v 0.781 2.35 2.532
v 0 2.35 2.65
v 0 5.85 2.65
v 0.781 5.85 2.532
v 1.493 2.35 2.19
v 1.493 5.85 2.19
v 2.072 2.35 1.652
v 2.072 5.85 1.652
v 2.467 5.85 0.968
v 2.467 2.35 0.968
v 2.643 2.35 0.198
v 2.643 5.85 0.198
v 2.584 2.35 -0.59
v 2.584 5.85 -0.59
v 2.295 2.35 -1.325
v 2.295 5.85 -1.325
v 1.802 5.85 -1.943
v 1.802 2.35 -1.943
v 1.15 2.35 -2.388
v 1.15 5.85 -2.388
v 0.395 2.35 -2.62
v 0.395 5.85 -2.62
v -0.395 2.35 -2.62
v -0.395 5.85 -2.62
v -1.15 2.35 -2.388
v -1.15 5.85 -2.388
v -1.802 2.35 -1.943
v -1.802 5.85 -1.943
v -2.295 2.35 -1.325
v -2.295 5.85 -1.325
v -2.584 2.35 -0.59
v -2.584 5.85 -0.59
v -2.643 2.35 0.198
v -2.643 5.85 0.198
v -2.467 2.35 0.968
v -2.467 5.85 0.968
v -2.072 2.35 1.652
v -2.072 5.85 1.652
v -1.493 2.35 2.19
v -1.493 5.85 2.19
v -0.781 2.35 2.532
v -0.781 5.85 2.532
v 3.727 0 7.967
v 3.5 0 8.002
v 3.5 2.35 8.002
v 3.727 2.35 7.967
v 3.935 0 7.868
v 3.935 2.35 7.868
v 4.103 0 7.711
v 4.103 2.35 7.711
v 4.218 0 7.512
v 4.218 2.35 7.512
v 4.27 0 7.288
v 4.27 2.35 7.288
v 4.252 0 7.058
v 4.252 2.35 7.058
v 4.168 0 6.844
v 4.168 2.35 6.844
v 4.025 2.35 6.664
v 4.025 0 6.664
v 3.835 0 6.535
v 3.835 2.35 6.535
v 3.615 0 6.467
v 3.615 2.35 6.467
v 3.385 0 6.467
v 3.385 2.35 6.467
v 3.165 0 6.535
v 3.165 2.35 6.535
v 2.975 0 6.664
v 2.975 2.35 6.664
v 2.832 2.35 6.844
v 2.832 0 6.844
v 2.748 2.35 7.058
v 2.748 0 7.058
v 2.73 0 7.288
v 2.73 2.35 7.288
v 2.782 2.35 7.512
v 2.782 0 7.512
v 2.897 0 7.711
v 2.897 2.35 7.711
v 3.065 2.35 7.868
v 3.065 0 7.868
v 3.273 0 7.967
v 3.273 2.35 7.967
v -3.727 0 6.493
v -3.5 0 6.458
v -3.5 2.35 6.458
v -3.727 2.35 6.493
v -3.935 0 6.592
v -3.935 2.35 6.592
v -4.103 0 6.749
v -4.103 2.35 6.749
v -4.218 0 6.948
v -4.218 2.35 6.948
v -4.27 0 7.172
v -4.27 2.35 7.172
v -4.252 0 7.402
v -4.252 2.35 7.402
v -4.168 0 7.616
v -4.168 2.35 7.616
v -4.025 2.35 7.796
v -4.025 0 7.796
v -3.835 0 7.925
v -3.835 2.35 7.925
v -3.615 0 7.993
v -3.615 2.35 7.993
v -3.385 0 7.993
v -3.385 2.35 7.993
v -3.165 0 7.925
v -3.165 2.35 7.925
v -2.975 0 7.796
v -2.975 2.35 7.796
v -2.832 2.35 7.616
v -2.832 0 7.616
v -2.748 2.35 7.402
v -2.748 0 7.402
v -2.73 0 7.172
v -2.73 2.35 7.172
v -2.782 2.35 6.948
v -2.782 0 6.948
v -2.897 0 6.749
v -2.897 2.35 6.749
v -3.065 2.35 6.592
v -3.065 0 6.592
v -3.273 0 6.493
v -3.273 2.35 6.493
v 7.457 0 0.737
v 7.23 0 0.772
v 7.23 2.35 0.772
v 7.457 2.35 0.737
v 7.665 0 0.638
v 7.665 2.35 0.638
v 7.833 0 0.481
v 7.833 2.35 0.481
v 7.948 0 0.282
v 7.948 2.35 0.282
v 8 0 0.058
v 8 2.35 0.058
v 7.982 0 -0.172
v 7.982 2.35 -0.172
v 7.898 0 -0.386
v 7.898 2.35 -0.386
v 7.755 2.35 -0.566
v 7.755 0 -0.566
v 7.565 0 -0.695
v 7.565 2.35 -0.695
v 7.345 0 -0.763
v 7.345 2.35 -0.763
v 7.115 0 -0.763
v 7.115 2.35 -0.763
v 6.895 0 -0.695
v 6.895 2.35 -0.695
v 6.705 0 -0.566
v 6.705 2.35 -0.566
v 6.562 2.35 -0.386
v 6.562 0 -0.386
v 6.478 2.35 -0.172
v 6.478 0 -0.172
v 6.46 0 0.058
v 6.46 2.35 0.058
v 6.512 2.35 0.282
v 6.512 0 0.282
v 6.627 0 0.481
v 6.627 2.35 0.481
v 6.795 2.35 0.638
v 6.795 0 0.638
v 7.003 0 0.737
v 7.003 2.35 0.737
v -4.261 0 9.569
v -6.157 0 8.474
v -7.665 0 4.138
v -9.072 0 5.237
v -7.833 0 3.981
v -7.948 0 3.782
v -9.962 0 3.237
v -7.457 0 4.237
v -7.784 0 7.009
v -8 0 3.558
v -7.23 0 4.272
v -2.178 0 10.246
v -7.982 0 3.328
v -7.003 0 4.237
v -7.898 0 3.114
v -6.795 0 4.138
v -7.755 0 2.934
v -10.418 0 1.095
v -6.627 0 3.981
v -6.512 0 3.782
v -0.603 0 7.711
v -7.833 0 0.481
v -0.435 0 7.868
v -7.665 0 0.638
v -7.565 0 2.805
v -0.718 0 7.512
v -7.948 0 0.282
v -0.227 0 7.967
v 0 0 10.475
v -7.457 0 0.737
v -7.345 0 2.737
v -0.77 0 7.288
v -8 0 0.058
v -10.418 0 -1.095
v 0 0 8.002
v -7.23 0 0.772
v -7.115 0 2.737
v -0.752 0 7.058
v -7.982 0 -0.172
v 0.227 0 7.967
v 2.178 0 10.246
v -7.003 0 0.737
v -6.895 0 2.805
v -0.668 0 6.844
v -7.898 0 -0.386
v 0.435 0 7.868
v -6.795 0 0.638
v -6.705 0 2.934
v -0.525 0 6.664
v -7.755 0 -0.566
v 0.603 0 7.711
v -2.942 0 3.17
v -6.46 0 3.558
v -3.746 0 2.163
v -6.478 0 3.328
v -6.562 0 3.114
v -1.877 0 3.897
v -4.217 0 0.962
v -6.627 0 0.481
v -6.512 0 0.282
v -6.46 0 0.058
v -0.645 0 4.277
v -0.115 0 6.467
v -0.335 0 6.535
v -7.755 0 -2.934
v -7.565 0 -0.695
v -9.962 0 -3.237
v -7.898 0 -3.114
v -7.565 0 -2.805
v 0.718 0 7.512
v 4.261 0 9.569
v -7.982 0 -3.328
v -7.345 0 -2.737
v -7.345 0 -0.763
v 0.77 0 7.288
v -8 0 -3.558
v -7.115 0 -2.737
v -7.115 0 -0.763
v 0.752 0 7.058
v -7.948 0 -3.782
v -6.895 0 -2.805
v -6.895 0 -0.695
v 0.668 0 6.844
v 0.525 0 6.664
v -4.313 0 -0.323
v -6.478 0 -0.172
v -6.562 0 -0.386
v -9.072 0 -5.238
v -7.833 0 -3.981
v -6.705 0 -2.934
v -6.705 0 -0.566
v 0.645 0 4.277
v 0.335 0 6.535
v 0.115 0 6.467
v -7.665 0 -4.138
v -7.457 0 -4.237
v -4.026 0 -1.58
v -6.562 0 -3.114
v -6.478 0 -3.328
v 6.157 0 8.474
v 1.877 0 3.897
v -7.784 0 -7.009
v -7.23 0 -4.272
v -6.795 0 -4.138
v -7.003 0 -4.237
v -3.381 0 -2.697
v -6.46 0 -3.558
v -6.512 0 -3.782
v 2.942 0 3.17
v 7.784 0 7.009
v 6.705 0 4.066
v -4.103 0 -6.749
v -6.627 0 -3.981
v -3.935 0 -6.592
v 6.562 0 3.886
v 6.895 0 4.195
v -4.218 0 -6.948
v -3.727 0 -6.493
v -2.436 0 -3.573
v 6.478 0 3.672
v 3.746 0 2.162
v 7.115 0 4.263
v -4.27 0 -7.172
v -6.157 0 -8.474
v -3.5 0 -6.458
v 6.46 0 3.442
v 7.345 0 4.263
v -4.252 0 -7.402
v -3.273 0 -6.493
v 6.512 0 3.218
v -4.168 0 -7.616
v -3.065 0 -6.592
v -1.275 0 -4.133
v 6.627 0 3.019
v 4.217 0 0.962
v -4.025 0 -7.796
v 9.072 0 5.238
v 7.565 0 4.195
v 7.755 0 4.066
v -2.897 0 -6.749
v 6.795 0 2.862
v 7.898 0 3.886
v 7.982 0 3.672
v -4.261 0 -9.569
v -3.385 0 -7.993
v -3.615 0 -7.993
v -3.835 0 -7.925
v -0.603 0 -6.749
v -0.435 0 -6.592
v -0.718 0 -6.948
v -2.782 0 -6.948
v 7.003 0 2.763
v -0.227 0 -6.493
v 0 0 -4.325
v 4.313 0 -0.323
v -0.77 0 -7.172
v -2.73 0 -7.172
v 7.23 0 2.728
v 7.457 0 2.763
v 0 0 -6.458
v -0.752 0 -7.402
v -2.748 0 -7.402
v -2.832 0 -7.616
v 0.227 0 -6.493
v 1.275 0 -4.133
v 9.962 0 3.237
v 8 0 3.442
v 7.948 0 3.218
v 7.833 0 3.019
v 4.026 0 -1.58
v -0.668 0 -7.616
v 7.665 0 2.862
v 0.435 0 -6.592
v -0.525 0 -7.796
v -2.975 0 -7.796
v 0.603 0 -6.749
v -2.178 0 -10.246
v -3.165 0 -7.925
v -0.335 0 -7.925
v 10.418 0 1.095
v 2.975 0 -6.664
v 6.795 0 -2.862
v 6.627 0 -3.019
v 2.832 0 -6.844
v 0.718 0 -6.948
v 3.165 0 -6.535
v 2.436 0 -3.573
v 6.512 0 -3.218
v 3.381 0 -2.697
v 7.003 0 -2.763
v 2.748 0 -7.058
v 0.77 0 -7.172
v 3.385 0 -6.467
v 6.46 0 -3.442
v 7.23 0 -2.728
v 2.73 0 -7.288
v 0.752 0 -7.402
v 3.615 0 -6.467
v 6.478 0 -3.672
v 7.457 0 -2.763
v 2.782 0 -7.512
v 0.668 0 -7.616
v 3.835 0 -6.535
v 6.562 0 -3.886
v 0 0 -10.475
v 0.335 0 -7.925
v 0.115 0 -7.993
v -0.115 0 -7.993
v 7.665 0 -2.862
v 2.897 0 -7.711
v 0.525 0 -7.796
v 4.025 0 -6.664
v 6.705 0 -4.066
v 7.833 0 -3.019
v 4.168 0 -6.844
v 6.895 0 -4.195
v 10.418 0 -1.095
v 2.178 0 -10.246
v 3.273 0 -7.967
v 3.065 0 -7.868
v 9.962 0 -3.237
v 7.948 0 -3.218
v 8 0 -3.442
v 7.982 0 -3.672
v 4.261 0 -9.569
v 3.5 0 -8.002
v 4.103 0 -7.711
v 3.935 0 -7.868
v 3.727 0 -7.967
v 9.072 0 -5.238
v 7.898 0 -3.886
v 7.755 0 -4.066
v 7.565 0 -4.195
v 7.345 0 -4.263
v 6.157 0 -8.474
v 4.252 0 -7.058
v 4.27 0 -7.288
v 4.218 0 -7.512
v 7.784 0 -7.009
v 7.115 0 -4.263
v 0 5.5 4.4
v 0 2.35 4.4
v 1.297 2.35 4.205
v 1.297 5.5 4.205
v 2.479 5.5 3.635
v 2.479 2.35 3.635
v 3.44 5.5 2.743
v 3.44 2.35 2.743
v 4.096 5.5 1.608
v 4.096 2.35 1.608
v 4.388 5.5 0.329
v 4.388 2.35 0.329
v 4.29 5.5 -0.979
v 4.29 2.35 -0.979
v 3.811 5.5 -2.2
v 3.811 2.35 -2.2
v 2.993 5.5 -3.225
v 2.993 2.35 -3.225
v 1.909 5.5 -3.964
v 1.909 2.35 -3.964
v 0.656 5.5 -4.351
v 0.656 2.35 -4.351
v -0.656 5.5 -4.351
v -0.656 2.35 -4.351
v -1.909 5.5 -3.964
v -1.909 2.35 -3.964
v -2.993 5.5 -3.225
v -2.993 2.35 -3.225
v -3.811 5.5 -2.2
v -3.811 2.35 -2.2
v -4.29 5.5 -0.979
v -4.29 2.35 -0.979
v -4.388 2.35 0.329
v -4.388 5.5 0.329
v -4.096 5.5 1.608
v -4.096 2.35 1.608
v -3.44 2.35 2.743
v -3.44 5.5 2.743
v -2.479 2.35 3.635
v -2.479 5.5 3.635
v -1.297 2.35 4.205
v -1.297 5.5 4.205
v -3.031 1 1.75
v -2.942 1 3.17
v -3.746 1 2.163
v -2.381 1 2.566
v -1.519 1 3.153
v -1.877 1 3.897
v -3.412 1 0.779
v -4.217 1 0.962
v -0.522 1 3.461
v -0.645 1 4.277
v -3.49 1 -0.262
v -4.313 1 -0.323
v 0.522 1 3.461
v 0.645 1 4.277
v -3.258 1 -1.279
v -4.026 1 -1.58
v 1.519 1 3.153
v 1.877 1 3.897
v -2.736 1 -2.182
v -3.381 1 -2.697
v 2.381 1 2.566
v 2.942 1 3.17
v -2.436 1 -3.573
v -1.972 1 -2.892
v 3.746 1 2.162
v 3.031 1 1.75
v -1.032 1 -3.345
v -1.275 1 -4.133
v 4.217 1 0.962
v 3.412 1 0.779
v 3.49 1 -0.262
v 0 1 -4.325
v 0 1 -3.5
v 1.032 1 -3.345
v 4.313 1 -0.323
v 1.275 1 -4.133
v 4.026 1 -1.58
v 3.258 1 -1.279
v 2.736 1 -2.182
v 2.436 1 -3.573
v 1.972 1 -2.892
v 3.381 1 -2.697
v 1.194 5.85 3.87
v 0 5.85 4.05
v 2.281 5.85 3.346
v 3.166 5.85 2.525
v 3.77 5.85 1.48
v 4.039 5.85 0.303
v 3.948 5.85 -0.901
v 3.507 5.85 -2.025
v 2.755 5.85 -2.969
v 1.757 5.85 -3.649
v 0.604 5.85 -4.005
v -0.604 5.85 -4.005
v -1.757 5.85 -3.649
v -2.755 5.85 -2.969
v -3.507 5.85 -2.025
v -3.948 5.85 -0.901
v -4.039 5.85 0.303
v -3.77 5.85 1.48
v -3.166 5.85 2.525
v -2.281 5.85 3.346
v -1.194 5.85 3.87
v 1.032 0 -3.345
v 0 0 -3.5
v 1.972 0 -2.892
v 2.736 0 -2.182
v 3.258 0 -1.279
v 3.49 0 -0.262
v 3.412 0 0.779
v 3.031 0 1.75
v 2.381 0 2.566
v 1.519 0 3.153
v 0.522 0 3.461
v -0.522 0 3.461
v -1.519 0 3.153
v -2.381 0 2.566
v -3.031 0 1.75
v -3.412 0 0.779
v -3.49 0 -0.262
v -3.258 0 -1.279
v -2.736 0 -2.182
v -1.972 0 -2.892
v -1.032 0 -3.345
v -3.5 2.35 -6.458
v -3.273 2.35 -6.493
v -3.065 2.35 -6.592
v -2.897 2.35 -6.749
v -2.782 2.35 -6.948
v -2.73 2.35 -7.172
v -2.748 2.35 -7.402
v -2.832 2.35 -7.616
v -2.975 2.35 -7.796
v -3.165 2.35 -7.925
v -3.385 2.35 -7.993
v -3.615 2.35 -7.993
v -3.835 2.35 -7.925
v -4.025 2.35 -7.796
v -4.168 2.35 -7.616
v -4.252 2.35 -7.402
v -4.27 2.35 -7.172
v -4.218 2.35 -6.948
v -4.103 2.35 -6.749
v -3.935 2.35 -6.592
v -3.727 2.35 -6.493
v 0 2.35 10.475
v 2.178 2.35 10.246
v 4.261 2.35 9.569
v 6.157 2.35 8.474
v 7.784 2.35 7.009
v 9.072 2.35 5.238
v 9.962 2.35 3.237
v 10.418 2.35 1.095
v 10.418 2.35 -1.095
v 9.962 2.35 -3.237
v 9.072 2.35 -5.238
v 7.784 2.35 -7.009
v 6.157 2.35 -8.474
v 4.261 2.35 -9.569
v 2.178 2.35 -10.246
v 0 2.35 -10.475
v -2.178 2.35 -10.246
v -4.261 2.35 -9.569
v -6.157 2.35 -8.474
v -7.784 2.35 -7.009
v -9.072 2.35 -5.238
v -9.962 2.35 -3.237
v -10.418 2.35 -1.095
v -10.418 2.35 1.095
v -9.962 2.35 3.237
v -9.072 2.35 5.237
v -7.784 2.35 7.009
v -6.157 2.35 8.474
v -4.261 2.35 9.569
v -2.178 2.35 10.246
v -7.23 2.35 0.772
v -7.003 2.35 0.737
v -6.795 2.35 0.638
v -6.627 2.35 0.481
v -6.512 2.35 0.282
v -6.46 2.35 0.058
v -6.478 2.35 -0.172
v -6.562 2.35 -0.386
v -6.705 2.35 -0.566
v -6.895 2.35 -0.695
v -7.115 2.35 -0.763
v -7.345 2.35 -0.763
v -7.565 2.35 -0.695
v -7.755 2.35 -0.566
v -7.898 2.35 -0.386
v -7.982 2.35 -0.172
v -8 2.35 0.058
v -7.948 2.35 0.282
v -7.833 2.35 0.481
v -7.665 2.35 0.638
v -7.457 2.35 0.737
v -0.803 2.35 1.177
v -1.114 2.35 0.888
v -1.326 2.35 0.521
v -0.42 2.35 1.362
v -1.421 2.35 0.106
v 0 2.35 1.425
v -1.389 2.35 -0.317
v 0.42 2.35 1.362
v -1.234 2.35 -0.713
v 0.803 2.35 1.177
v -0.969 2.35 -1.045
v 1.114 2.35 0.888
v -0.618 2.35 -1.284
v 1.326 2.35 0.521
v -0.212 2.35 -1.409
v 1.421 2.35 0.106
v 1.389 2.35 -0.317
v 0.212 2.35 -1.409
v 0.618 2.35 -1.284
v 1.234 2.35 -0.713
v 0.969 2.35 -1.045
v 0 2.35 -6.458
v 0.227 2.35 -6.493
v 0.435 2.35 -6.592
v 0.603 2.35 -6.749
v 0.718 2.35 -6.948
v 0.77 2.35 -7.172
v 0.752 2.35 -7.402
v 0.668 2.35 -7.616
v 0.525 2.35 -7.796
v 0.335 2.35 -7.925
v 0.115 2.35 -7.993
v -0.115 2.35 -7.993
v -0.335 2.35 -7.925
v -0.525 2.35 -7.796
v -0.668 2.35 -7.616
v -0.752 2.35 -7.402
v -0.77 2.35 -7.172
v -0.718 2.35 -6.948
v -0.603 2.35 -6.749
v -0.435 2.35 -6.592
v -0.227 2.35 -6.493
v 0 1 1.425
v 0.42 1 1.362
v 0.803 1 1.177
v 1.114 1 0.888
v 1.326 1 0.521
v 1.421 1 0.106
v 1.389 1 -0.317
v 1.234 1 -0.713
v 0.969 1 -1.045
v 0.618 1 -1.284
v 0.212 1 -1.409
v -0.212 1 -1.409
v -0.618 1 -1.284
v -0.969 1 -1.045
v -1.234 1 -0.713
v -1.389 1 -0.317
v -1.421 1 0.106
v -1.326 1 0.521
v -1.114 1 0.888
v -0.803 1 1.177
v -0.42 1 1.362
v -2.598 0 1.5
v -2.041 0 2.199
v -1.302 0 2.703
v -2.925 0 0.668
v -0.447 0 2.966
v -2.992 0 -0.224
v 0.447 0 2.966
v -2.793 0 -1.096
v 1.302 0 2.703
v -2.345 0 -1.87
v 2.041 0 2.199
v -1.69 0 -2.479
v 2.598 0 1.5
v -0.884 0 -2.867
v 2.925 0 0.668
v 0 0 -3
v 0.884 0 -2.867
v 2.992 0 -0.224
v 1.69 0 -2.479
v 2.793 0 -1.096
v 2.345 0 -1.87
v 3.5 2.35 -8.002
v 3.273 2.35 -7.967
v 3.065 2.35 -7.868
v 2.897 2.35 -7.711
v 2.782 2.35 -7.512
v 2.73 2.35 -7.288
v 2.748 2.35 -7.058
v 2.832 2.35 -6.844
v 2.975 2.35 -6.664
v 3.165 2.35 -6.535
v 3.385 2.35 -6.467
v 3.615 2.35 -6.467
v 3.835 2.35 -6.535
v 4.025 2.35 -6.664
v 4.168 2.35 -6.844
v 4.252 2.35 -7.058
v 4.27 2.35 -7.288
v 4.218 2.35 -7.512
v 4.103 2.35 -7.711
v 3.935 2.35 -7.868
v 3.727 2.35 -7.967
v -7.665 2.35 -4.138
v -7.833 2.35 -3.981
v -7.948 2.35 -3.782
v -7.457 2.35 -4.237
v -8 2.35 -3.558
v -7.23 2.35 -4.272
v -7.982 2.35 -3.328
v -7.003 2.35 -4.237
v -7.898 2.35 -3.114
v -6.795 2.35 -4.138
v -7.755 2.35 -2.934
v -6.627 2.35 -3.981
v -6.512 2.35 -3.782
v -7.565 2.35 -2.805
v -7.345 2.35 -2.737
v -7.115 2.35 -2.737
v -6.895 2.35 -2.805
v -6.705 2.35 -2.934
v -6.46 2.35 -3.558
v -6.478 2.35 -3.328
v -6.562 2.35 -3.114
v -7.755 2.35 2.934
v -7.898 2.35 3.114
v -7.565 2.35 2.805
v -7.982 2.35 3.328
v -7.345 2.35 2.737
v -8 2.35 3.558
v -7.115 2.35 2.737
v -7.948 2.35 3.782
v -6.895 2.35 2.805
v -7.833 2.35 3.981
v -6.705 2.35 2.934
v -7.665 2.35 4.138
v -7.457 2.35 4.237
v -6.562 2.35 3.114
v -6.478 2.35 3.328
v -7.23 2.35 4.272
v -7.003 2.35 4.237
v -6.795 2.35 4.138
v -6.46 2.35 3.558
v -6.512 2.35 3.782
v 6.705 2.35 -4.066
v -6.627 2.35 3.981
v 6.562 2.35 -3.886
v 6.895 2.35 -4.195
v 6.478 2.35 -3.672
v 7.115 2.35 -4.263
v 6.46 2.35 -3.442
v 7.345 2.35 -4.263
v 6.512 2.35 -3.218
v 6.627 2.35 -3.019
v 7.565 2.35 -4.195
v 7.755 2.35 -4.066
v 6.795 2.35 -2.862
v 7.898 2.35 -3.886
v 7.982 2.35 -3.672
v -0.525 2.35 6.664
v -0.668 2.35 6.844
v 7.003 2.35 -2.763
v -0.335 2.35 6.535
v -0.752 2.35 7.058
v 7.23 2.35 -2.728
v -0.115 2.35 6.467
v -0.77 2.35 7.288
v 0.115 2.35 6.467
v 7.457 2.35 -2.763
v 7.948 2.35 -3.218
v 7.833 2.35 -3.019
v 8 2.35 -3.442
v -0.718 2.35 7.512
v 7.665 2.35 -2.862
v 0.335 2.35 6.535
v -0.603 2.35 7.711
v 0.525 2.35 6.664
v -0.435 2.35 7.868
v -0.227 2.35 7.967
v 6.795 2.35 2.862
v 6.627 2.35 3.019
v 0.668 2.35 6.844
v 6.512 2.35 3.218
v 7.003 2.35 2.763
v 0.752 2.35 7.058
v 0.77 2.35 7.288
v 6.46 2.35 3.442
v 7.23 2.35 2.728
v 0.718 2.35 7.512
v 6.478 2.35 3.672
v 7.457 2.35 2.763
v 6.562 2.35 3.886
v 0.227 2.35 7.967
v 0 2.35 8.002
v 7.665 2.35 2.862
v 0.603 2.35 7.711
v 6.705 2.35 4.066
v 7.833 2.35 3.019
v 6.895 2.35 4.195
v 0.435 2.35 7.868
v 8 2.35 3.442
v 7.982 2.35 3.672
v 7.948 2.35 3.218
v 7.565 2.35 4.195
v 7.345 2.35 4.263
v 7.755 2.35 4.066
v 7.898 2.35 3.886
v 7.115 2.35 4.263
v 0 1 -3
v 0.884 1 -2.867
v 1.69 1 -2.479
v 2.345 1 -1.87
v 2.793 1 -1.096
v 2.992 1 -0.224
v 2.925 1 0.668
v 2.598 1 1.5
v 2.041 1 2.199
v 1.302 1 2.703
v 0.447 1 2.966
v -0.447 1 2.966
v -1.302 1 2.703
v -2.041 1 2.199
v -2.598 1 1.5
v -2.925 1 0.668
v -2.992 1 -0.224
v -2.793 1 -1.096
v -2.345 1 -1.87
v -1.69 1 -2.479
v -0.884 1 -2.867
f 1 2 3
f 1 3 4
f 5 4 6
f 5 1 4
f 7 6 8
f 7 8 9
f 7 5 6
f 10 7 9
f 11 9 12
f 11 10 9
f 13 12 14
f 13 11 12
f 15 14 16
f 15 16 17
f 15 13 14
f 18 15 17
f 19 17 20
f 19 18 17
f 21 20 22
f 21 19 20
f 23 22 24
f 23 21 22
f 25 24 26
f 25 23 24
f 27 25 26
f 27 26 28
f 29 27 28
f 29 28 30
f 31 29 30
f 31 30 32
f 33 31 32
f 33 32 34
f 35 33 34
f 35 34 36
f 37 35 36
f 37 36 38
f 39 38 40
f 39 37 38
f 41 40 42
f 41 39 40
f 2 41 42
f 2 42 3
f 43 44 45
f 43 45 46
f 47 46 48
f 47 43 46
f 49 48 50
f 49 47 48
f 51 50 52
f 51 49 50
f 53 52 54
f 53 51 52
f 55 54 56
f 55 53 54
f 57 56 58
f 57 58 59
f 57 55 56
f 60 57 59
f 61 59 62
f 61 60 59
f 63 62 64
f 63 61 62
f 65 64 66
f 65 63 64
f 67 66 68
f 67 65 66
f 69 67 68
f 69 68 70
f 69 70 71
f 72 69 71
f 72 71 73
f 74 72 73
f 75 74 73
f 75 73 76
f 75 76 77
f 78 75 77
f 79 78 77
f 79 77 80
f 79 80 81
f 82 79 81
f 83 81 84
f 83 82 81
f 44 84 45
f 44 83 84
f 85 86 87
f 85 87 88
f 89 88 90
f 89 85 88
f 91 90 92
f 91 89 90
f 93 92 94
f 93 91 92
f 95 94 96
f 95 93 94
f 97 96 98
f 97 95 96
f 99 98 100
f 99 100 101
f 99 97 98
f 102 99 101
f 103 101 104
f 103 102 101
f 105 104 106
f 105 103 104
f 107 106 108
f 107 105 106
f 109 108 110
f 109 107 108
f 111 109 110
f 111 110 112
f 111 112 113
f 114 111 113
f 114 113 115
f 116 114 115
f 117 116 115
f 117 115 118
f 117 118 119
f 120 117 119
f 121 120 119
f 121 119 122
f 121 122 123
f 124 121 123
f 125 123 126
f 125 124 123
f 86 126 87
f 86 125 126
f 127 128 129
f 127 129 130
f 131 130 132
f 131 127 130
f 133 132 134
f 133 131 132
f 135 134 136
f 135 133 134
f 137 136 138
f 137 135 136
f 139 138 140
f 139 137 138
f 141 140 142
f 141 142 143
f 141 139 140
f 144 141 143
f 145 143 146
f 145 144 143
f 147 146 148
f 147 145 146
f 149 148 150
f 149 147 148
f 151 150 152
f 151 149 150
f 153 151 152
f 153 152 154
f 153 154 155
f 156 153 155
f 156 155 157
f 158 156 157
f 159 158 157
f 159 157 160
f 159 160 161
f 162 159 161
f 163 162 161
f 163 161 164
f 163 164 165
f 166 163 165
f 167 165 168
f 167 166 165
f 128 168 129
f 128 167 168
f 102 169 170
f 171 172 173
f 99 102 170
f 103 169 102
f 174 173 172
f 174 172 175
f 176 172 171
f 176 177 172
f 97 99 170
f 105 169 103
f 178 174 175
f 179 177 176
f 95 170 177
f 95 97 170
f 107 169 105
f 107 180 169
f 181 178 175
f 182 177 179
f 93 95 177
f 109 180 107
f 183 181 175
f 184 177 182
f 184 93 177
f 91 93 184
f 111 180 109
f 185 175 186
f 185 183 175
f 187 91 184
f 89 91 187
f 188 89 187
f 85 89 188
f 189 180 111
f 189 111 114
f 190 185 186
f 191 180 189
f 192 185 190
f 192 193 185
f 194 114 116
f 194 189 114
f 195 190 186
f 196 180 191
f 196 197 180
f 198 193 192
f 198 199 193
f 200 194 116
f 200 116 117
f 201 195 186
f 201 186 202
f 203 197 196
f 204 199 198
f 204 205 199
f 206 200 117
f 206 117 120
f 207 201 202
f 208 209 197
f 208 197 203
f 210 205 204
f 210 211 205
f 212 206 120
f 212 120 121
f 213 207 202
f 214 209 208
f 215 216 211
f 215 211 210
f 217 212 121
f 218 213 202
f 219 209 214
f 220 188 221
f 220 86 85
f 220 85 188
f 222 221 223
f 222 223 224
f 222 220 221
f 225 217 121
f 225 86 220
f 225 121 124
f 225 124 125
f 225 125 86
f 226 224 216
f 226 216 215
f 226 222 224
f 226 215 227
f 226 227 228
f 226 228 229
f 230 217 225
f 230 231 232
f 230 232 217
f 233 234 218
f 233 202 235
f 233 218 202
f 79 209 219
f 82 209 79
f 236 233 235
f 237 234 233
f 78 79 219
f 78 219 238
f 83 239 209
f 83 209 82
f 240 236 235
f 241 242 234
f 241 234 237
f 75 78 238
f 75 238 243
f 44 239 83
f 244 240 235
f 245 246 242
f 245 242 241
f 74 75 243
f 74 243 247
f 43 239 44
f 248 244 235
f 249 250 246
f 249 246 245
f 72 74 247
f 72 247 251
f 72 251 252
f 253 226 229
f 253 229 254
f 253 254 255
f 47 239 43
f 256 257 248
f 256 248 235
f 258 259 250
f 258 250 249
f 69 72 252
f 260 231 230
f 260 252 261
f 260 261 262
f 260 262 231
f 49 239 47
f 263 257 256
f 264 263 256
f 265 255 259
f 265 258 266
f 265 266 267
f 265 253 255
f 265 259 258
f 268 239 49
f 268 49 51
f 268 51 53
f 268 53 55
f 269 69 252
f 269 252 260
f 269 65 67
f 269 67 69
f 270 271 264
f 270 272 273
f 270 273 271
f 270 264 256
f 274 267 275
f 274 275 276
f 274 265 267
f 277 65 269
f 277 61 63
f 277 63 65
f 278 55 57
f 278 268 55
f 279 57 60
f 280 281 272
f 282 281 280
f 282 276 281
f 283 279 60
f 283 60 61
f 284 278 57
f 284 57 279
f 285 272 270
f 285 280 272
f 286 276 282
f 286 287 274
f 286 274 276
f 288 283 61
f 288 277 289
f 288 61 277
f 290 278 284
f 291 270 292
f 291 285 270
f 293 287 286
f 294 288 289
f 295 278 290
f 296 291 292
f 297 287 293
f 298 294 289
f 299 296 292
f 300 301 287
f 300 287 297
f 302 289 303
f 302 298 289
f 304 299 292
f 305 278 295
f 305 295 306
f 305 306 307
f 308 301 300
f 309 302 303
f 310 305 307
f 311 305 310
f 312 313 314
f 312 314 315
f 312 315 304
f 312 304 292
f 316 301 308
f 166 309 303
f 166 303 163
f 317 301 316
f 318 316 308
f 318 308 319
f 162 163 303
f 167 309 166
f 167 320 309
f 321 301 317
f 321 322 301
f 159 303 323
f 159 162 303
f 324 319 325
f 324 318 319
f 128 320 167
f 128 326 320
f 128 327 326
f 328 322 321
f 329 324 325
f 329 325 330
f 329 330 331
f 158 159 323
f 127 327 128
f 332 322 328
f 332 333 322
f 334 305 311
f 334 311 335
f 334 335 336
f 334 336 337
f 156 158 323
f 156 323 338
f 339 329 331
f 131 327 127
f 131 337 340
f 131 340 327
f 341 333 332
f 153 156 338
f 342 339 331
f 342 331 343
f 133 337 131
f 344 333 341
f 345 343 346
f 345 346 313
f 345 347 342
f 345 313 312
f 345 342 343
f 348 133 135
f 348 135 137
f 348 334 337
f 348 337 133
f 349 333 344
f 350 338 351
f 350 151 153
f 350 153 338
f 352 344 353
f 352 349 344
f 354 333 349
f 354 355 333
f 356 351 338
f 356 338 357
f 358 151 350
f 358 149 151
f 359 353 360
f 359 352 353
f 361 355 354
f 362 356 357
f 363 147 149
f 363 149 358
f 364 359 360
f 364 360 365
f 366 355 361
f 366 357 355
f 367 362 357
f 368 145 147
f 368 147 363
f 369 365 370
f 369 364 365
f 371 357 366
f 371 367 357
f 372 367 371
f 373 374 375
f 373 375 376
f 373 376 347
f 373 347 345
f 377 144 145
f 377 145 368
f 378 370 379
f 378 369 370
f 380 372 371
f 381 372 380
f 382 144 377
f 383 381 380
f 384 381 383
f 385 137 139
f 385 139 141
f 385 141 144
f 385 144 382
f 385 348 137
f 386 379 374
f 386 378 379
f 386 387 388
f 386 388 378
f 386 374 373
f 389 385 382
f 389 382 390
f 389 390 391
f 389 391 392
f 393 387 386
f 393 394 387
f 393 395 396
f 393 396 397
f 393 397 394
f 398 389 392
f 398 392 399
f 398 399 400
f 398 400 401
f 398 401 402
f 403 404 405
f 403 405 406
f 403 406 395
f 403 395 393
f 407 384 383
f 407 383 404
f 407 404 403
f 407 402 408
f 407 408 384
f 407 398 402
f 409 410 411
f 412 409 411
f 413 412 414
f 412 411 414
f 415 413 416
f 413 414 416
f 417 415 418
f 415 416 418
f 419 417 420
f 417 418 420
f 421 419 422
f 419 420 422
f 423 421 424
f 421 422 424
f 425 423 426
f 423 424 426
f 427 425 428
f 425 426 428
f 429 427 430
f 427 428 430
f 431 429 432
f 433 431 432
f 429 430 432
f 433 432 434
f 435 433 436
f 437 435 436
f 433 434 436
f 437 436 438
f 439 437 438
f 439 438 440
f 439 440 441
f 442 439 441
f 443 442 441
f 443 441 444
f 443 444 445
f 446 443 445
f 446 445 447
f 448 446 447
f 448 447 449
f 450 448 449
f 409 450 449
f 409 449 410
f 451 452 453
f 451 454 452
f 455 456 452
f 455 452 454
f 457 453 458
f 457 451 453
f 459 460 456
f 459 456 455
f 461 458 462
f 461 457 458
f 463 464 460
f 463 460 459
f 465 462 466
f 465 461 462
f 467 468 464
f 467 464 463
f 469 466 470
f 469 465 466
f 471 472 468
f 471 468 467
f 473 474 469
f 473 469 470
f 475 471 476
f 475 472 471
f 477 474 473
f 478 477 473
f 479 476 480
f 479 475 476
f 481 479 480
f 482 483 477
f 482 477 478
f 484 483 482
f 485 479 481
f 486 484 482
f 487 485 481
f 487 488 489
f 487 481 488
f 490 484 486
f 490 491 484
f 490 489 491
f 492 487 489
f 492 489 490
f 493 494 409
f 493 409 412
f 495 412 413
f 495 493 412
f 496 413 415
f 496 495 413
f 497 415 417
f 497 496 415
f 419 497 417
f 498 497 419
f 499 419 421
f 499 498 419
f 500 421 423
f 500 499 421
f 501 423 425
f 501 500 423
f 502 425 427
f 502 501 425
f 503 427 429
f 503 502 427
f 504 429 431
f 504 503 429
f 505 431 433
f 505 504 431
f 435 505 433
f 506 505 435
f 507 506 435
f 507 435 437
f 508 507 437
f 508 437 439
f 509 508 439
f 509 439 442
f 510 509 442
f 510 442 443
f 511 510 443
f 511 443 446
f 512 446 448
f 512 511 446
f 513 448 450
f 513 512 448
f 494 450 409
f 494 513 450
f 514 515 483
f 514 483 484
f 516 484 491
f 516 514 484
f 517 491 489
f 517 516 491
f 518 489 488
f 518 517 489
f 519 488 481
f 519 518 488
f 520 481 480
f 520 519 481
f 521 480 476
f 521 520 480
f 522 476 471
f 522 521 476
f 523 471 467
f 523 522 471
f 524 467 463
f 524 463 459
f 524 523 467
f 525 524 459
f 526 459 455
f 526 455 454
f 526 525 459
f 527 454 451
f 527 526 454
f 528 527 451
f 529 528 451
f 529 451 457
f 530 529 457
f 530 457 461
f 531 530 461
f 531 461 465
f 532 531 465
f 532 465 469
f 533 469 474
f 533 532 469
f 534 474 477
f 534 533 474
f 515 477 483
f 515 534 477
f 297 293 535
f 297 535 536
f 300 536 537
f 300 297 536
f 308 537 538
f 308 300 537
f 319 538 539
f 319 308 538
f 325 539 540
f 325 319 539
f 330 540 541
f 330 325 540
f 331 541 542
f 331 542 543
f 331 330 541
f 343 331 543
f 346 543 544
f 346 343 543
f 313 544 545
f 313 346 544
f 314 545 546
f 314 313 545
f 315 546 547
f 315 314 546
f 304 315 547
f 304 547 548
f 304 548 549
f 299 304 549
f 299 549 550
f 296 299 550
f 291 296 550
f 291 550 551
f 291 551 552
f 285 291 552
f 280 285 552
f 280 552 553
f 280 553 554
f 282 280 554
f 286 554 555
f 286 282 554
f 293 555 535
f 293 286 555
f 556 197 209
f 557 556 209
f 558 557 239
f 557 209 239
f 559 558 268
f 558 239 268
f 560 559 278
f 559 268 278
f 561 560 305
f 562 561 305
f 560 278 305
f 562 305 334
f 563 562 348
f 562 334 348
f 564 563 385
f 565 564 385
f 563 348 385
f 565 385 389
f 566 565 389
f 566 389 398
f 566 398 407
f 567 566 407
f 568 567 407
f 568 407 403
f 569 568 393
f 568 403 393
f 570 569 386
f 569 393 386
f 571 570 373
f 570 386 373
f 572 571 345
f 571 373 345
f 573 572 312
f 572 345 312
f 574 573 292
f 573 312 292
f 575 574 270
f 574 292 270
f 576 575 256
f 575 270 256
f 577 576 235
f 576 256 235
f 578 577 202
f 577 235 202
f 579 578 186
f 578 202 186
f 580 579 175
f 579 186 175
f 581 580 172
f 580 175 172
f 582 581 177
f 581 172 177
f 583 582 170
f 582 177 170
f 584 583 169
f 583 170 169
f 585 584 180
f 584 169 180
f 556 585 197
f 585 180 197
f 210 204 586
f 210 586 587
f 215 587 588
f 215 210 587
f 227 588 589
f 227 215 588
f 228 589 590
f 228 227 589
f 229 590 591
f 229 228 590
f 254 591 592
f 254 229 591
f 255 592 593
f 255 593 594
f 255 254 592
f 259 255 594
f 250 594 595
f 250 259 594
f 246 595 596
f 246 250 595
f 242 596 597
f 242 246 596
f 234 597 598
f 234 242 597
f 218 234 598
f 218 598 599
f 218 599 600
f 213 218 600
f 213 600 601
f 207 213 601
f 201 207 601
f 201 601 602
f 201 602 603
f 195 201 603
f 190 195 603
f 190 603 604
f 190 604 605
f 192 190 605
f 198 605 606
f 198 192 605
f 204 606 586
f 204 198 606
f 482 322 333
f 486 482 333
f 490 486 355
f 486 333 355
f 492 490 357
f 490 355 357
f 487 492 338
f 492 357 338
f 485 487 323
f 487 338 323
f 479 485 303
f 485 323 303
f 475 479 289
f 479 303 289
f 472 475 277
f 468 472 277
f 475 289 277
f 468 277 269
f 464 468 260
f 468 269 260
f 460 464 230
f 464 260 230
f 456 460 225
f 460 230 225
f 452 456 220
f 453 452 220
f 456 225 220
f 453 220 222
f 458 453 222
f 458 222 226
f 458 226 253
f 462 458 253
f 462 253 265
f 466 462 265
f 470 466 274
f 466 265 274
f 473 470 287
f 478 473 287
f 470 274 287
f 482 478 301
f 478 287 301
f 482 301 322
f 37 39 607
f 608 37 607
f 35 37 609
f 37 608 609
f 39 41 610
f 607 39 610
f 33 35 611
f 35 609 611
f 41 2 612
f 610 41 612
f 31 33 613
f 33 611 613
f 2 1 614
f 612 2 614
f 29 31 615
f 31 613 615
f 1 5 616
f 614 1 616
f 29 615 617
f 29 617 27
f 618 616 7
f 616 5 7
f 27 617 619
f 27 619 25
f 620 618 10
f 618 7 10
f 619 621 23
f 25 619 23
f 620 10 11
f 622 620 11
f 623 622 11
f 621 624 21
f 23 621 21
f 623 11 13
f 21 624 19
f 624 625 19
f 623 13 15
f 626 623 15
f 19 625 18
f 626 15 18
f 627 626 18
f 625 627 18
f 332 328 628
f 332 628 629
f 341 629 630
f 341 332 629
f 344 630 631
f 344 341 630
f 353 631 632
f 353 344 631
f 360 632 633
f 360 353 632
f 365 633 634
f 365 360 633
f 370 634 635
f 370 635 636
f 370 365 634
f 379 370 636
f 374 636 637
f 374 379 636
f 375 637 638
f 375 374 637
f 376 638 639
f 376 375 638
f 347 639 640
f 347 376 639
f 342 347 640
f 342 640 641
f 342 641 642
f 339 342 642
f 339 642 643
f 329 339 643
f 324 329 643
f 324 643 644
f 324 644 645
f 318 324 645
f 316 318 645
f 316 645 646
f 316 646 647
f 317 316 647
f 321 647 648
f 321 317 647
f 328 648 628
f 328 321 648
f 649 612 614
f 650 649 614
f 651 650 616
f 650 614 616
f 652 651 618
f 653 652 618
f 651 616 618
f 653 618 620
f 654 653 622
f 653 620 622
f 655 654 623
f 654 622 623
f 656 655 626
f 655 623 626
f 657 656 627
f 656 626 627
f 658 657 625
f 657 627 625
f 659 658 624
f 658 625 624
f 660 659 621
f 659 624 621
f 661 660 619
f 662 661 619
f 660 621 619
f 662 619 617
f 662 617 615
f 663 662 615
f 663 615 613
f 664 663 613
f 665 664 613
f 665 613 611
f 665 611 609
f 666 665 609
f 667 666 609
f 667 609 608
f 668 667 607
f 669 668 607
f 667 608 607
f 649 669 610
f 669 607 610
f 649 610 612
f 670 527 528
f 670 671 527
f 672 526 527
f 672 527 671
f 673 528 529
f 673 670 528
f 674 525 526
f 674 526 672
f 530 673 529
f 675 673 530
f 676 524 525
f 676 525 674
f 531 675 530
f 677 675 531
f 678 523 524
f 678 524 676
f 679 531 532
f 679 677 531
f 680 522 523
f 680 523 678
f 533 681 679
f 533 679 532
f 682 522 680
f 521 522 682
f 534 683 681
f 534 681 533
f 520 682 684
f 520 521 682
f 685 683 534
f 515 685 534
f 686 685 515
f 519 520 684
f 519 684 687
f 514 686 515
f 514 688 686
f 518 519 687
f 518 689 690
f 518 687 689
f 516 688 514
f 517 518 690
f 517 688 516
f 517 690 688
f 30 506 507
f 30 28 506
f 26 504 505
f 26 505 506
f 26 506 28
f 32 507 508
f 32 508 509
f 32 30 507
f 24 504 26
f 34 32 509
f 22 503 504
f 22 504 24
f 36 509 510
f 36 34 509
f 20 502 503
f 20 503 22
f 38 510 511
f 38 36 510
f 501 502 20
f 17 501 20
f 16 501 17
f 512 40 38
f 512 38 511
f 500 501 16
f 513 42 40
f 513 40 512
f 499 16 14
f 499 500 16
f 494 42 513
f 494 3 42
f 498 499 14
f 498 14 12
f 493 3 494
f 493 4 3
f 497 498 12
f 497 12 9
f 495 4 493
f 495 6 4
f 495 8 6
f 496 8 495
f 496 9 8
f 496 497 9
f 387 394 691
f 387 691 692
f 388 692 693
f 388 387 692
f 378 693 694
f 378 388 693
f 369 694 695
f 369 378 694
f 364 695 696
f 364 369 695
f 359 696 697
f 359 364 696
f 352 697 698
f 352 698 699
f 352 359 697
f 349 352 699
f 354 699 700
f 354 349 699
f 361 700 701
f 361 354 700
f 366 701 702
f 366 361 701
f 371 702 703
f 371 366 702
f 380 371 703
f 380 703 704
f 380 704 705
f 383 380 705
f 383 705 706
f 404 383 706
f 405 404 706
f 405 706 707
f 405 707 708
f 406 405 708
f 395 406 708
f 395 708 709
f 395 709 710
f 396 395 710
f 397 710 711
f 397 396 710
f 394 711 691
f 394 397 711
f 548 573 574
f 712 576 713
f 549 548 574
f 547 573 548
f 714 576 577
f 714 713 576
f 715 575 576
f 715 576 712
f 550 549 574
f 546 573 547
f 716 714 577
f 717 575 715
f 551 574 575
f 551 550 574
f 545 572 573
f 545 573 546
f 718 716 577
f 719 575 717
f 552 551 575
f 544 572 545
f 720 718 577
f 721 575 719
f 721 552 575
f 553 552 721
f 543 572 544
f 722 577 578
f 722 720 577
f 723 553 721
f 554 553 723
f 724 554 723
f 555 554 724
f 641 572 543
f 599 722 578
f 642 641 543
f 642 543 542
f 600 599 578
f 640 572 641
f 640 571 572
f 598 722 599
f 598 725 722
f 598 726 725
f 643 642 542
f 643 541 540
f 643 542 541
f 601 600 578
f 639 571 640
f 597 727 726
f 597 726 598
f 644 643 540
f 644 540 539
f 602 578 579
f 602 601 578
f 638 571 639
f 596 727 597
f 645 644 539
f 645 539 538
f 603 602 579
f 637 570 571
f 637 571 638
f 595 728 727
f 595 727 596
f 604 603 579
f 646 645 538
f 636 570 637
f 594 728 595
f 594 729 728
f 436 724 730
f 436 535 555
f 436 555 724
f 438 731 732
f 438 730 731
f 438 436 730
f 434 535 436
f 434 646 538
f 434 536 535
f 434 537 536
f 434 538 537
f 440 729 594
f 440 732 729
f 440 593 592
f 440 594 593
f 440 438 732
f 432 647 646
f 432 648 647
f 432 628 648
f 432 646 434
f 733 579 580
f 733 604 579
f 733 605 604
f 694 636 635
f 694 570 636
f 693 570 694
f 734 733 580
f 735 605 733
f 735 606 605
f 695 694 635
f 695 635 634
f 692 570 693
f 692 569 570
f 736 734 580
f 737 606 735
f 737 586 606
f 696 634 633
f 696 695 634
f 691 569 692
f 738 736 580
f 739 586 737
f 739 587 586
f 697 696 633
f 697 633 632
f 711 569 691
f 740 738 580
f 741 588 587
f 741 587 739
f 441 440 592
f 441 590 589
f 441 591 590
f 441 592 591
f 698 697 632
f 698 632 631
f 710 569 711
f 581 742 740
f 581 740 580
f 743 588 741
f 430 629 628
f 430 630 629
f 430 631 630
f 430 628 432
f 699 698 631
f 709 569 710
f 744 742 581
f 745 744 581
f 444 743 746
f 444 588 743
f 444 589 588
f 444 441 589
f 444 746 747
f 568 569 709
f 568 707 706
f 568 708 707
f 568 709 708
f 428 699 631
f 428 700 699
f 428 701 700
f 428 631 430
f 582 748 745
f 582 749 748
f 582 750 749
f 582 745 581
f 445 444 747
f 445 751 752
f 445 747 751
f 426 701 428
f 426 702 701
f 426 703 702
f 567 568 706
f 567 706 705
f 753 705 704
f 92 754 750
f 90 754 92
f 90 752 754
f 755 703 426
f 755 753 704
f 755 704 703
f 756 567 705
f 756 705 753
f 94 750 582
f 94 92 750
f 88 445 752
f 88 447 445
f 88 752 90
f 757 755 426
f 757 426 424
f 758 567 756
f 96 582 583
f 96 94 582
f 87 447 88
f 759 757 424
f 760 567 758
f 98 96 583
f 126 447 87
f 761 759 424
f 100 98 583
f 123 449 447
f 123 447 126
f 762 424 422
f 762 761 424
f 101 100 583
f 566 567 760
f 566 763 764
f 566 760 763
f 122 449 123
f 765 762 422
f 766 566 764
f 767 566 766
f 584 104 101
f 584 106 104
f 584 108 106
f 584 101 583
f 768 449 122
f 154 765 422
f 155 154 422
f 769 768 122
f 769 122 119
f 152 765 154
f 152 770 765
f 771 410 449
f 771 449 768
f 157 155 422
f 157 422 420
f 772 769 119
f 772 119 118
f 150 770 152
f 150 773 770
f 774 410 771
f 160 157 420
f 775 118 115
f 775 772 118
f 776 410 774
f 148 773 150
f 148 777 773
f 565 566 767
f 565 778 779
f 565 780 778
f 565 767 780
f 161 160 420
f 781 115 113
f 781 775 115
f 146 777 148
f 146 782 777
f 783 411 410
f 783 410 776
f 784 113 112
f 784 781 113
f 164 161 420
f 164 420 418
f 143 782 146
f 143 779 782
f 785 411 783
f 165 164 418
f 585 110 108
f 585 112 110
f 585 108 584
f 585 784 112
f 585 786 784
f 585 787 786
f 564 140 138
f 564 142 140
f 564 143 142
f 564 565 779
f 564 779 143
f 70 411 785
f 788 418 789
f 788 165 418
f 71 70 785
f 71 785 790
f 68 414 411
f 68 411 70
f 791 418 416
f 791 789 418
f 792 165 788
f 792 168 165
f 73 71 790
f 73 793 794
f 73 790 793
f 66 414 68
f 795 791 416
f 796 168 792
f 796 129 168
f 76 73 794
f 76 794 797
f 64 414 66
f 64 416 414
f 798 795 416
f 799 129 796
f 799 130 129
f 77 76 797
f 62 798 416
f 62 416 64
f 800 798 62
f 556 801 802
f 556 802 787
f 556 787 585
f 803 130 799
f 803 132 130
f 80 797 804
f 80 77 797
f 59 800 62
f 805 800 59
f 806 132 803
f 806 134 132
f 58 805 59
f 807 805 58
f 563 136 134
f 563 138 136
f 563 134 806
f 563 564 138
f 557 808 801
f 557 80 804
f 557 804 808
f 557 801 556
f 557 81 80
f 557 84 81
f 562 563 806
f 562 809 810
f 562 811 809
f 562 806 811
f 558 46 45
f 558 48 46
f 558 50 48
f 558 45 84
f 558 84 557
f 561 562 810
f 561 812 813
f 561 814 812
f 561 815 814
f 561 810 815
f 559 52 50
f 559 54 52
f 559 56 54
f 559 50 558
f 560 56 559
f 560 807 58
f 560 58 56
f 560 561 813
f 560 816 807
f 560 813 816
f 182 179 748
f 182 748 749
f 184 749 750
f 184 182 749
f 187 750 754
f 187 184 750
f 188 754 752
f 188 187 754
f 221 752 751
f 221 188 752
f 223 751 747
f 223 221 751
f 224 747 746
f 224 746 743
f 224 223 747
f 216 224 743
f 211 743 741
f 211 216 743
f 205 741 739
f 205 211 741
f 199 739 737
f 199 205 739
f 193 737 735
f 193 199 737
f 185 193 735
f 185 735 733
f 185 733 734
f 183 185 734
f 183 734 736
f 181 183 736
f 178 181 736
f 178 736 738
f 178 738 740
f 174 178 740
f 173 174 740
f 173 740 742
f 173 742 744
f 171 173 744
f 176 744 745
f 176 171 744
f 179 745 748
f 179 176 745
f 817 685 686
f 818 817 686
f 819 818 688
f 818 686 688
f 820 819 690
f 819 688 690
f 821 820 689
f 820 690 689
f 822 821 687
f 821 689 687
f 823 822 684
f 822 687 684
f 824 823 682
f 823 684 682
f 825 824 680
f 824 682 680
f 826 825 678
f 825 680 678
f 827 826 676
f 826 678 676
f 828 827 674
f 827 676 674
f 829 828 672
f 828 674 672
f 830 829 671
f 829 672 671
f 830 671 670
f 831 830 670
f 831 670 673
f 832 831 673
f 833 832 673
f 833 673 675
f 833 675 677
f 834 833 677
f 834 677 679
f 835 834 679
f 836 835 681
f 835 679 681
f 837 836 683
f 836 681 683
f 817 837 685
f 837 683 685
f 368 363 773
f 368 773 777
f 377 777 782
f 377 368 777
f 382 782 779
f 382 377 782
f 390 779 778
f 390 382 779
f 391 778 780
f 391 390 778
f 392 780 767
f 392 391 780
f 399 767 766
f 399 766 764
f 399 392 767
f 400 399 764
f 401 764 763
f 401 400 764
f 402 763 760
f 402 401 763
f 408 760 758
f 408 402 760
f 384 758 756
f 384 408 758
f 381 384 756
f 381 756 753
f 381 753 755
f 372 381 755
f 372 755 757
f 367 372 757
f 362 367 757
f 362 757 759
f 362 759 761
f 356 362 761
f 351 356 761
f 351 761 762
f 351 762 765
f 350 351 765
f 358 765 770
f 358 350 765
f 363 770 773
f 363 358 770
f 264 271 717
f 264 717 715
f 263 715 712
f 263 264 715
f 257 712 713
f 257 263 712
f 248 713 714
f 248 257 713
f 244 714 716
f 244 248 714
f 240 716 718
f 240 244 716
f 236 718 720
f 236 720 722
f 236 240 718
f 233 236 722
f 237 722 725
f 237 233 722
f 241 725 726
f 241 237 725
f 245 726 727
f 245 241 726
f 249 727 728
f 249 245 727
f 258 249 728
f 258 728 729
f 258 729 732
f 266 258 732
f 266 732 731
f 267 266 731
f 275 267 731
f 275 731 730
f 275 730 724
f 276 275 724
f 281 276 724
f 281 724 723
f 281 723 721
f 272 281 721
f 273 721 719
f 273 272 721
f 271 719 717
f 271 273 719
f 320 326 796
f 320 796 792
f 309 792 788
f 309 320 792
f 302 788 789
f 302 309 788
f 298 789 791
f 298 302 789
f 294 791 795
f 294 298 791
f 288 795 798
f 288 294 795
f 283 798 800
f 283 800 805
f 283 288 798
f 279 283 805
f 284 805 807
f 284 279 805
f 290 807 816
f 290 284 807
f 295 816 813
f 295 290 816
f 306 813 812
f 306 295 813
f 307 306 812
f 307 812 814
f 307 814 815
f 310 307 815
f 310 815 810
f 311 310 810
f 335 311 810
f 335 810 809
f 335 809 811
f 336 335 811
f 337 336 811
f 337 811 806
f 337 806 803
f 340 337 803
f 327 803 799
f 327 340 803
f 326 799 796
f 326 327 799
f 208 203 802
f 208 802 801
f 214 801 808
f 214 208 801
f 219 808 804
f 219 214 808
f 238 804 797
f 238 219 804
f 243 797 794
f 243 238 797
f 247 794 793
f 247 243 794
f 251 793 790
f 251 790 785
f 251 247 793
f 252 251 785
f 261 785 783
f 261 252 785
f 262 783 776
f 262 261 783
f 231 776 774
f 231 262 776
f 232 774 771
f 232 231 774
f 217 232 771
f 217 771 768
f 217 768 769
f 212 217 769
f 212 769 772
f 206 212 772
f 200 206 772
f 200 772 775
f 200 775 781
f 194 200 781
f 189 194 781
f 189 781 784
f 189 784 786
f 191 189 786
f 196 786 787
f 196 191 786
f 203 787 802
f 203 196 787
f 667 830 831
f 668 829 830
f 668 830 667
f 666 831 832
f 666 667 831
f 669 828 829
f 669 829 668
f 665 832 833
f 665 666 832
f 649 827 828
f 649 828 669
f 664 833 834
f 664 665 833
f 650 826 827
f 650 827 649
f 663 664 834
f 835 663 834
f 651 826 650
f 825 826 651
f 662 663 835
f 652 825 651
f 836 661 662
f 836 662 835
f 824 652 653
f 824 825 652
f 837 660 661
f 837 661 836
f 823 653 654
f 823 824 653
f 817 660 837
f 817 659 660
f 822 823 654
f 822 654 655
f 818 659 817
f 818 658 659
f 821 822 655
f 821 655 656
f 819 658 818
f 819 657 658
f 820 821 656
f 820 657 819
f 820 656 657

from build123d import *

# Parameters (mm, degrees)
SKETCH_2_R          = 10.475
SKETCH_2_R_2        = 4.4
SKETCH_2_R_3        = 0.771713969
EXTRUDE_1_DEPTH     = 2.35
SKETCH_3_R          = 4.4
SKETCH_3_R_2        = 2.65
EXTRUDE_2_DEPTH     = 3.5
CHAMFER_1_SIZE      = 0.35
SKETCH_4_R          = 4.4
EXTRUDE_3_DEPTH     = 2.35
SKETCH_5_R          = 3
CUT_EXTRUDE_1_DEPTH = 1
SKETCH_6_R          = 1.425
CUT_EXTRUDE_2_DEPTH = 1.35
SKETCH_7_R          = 4.325
SKETCH_7_R_2        = 3.5
CUT_EXTRUDE_3_DEPTH = 1


with BuildPart() as part:
    # 草图2 → 凸台-拉伸1 (new body)
    with BuildSketch(Plane(origin=(0, 0, 0), x_dir=(1, 0, 0), z_dir=(0, 1, 0))):
        with Locations(Location((0, 0, 0), (0, 0, 270))):
            Circle(SKETCH_2_R)
        with Locations(Location((0, 0, 0), (0, 0, 270))):
            Circle(SKETCH_2_R_2, mode=Mode.SUBTRACT)
        with Locations(Location((0, 7.23, 0), (0, 0, 270))):
            Circle(SKETCH_2_R_3, mode=Mode.SUBTRACT)
        with Locations(Location((-3.5, 7.23, 0), (0, 0, 270))):
            Circle(SKETCH_2_R_3, mode=Mode.SUBTRACT)
        with Locations(Location((3.5, 7.23, 0), (0, 0, 90))):
            Circle(SKETCH_2_R_3, mode=Mode.SUBTRACT)
        with Locations(Location((7.23, 3.5, 0), (0, 0, 270))):
            Circle(SKETCH_2_R_3, mode=Mode.SUBTRACT)
        with Locations(Location((7.23, 0, 0), (0, 0, 270))):
            Circle(SKETCH_2_R_3, mode=Mode.SUBTRACT)
        with Locations(Location((7.23, -3.5, 0), (0, 0, 90))):
            Circle(SKETCH_2_R_3, mode=Mode.SUBTRACT)
        with Locations(Location((3.5, -7.23, 0), (0, 0, 270))):
            Circle(SKETCH_2_R_3, mode=Mode.SUBTRACT)
        with Locations(Location((0, -7.23, 0), (0, 0, 270))):
            Circle(SKETCH_2_R_3, mode=Mode.SUBTRACT)
        with Locations(Location((-3.5, -7.23, 0), (0, 0, 90))):
            Circle(SKETCH_2_R_3, mode=Mode.SUBTRACT)
        with Locations(Location((-7.23, -3.5, 0), (0, 0, 270))):
            Circle(SKETCH_2_R_3, mode=Mode.SUBTRACT)
        with Locations(Location((-7.23, 0, 0), (0, 0, 270))):
            Circle(SKETCH_2_R_3, mode=Mode.SUBTRACT)
        with Locations(Location((-7.23, 3.5, 0), (0, 0, 90))):
            Circle(SKETCH_2_R_3, mode=Mode.SUBTRACT)
    extrude(amount=EXTRUDE_1_DEPTH)



with BuildPart() as body_2:
    # 草图3 → 凸台-拉伸2 (new body)
    with BuildSketch(Plane(origin=(0, 2.35, 0), x_dir=(1, 0, 0), z_dir=(0, 1, 0))):
        with Locations(Location((0, 0, 0), (0, 0, 270))):
            Circle(SKETCH_3_R)
        with Locations(Location((0, 0, 0), (0, 0, 270))):
            Circle(SKETCH_3_R_2, mode=Mode.SUBTRACT)
    extrude(amount=EXTRUDE_2_DEPTH)

    # 倒角1
    chamfer_1_edges = [body_2.edges().sort_by_distance(p)[0] for p in [
        (0, 5.85, -4.4),
    ]]
    chamfer(chamfer_1_edges, length=CHAMFER_1_SIZE)


with BuildPart() as part_1:
    add(part.part)

    add(body_2.part)  # 凸台-拉伸3 merges body 2
    # 草图4 → 凸台-拉伸3 (add)
    with BuildSketch(Plane.XZ):
        with Locations(Location((0, 0, 0), (0, 0, 270))):
            Circle(SKETCH_4_R)
    extrude(amount=-EXTRUDE_3_DEPTH)

    # 草图5 → 切除-拉伸1 (cut)
    with BuildSketch(Plane.XZ):
        with Locations(Location((0, 0, 0), (0, 0, 270))):
            Circle(SKETCH_5_R)
    extrude(amount=-CUT_EXTRUDE_1_DEPTH, mode=Mode.SUBTRACT)

    # 草图6 → 切除-拉伸2 (cut)
    with BuildSketch(Plane(origin=(0, 2.35, 0), x_dir=(1, 0, 0), z_dir=(0, 1, 0))):
        with Locations(Location((0, 0, 0), (0, 0, 270))):
            Circle(SKETCH_6_R)
    extrude(amount=-CUT_EXTRUDE_2_DEPTH, mode=Mode.SUBTRACT)

    # 草图7 → 切除-拉伸3 (cut)
    with BuildSketch(Plane.XZ):
        with Locations(Location((0, 0, 0), (0, 0, 270))):
            Circle(SKETCH_7_R)
        with Locations(Location((0, 0, 0), (0, 0, 270))):
            Circle(SKETCH_7_R_2, mode=Mode.SUBTRACT)
    extrude(amount=-CUT_EXTRUDE_3_DEPTH, mode=Mode.SUBTRACT)


solid = part_1.part
